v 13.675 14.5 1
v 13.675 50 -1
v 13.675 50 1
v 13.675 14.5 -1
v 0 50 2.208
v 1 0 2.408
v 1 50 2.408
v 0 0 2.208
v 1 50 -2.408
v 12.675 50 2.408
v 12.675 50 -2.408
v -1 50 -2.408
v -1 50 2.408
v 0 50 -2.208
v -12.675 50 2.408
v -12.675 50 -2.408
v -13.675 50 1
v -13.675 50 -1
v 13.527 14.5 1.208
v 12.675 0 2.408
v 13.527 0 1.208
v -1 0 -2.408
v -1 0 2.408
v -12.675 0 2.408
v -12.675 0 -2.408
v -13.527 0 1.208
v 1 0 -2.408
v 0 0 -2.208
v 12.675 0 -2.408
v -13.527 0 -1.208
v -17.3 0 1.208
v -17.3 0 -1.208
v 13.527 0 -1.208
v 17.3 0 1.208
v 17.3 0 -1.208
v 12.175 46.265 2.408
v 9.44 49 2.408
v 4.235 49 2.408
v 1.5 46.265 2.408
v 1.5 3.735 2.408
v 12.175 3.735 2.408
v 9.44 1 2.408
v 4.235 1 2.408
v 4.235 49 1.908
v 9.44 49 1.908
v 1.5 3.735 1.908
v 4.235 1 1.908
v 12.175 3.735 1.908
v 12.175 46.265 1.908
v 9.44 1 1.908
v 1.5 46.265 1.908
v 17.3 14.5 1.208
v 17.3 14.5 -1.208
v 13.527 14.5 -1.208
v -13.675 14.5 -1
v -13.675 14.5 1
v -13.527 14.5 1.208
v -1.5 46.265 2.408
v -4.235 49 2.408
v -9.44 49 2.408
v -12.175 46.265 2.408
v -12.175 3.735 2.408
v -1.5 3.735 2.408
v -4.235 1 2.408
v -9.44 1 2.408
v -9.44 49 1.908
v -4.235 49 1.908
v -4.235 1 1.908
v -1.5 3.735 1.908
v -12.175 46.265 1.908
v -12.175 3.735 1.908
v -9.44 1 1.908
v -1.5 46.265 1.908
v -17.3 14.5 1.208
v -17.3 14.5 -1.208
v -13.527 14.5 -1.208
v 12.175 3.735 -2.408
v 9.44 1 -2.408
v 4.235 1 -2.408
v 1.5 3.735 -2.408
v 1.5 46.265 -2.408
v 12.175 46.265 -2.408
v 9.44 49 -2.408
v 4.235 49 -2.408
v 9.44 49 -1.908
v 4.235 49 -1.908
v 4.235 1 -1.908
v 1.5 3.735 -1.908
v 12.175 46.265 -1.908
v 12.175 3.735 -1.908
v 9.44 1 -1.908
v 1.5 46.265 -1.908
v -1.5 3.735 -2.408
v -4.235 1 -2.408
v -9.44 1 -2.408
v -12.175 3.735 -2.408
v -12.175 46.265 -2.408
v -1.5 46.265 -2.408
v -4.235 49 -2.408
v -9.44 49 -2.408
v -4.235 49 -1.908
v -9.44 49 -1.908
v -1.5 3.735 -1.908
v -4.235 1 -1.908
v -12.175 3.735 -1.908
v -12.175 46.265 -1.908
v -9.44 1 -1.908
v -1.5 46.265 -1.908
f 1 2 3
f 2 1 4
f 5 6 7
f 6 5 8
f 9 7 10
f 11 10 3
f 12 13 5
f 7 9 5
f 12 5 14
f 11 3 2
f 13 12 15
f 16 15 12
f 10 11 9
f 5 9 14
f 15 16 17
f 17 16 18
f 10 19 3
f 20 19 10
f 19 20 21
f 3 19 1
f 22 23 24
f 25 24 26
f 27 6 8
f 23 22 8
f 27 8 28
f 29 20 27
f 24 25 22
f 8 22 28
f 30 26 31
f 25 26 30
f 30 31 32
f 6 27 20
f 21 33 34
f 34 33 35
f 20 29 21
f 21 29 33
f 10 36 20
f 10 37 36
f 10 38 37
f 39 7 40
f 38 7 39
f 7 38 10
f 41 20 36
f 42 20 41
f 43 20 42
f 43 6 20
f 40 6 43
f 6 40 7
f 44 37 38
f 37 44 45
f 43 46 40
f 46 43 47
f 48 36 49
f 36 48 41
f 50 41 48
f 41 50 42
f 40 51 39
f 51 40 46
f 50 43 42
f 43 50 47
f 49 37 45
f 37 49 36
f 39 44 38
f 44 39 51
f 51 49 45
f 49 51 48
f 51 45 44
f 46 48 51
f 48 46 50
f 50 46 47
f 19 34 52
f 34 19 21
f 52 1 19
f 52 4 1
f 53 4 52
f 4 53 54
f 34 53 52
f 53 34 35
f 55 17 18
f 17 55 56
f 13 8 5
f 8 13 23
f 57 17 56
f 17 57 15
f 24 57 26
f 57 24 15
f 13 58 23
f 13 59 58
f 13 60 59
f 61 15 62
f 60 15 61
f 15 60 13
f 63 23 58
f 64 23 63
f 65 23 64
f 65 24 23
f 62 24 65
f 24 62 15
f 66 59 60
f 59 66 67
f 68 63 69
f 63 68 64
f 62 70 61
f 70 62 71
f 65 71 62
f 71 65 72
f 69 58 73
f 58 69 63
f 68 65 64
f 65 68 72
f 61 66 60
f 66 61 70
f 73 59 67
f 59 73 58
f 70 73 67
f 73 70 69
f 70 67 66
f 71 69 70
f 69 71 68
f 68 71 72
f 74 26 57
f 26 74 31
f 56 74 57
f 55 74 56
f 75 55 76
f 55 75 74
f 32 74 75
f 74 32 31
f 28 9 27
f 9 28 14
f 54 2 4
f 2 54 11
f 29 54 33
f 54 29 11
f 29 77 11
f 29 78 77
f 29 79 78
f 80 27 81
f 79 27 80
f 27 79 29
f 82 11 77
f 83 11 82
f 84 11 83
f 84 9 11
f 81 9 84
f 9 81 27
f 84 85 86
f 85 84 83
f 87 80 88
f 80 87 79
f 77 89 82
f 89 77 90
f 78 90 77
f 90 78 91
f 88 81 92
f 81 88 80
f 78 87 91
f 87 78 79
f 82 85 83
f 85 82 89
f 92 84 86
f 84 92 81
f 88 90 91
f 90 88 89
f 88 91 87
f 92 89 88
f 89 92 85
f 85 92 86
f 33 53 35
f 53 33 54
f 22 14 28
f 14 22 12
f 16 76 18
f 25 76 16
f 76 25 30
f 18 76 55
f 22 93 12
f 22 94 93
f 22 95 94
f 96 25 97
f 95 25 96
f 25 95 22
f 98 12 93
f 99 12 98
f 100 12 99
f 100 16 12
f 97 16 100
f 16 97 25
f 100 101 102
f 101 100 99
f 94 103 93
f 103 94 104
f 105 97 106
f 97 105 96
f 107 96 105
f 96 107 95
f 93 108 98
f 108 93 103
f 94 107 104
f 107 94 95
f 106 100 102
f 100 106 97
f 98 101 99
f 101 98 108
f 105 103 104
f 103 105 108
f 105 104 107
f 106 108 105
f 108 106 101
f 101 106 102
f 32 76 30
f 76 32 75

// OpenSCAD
// file: ../../girl/girl_common.scad
// Copyright 2025 Natalie Baker // Apache v2 //

// // Settings // //

tile_tol   = 0.5; 
base_size  = 35;
wall_width = (50-(base_size+tile_tol))/2;

// // Magnets // //

magnet_dia    = 6.2;
magnet_height = 2.8;

// // Lock // //

lock_height   = 1.9;
lock_depth    = 4.9;
lock_shoulder = 2.0;
lock_width     = 11; 

// // Grid // //

grid_key_width = 1.8;

grid_tile_size =  base_size + 2*wall_width;
grid_tile_diag   = sqrt(2*grid_tile_size*grid_tile_size);

grid_base_size   = grid_tile_size + tile_tol;
grid_base_diag   = sqrt(2*grid_base_size*grid_base_size);
grid_base_height = max(lock_height, magnet_height)+1.2;

// // Tile // //

tile_height        = grid_base_height;
tile_top_thickness = tile_height-magnet_height;

// // Frame // //

frame_size = lock_depth;

// // Util // //

module mirror_copy(m) {
	mirror(m) children();
	children();	
}

module rotate_copy(a) {
	rotate(a) children();
	children();	
}

module repeat(size, x, y, z, center) {
	off = center 
		? [(x-1)*size[0],(y-1)*size[1],(z-1)*size[2]]/2 
		: [0,0,0];

	for(i = [0 : x-1])
	for(j = [0 : y-1])
	for(k = [0 : z-1])
		translate([
			size[0]*i-off[0],
			size[1]*j-off[1],
			size[2]*k-off[2]
		]) children();
}
// main file
// Copyright 2025 Natalie Baker // Apache v2 //

include<../../girl/girl_common.scad>;

scifi_door();

module scifi_door(
	size = [
		grid_tile_size - 2*wall_width - 0.4, 
		50.0, 
		wall_width/3
	],
	wall_height=grid_tile_size/3
) {
	
	mirror_copy([0,0,1])
	mirror_copy([1,0]) {
		_scifi_door_part(size);
		
		linear_extrude(size[2]/2)
			square([size[0]/2, wall_height-2]);
	}
	
	

}


module _scifi_door_part(
	size = [
		grid_tile_size - wall_width - 0.4, 
		50.0, 
		wall_width/3
	]
) {
	
	passage_o = wall_width/2;
	passage_w = size[0] - 2*passage_o;
	passage_h = size[1];
	
	difference() {
		translate([0, passage_h,0])
		rotate([90,0,0])
		linear_extrude(passage_h)
		polygon([
			[0,0],
			[0,size[2]/2+1],
			[1,size[2]/2+1.2],
			[passage_w/2-1,size[2]/2+1.2],
			[passage_w/2,1],
			[passage_w/2,0],

		]);
		
		translate([0,0,(size[2]/2+1.2-0.5)])
		linear_extrude(0.6)
		translate([1.5, 1])
		offset( passage_w/10, $fn=1)
		offset(-passage_w/10, $fn=1)
			square([passage_w/2 - 3, passage_h - 2]);
	}

}
